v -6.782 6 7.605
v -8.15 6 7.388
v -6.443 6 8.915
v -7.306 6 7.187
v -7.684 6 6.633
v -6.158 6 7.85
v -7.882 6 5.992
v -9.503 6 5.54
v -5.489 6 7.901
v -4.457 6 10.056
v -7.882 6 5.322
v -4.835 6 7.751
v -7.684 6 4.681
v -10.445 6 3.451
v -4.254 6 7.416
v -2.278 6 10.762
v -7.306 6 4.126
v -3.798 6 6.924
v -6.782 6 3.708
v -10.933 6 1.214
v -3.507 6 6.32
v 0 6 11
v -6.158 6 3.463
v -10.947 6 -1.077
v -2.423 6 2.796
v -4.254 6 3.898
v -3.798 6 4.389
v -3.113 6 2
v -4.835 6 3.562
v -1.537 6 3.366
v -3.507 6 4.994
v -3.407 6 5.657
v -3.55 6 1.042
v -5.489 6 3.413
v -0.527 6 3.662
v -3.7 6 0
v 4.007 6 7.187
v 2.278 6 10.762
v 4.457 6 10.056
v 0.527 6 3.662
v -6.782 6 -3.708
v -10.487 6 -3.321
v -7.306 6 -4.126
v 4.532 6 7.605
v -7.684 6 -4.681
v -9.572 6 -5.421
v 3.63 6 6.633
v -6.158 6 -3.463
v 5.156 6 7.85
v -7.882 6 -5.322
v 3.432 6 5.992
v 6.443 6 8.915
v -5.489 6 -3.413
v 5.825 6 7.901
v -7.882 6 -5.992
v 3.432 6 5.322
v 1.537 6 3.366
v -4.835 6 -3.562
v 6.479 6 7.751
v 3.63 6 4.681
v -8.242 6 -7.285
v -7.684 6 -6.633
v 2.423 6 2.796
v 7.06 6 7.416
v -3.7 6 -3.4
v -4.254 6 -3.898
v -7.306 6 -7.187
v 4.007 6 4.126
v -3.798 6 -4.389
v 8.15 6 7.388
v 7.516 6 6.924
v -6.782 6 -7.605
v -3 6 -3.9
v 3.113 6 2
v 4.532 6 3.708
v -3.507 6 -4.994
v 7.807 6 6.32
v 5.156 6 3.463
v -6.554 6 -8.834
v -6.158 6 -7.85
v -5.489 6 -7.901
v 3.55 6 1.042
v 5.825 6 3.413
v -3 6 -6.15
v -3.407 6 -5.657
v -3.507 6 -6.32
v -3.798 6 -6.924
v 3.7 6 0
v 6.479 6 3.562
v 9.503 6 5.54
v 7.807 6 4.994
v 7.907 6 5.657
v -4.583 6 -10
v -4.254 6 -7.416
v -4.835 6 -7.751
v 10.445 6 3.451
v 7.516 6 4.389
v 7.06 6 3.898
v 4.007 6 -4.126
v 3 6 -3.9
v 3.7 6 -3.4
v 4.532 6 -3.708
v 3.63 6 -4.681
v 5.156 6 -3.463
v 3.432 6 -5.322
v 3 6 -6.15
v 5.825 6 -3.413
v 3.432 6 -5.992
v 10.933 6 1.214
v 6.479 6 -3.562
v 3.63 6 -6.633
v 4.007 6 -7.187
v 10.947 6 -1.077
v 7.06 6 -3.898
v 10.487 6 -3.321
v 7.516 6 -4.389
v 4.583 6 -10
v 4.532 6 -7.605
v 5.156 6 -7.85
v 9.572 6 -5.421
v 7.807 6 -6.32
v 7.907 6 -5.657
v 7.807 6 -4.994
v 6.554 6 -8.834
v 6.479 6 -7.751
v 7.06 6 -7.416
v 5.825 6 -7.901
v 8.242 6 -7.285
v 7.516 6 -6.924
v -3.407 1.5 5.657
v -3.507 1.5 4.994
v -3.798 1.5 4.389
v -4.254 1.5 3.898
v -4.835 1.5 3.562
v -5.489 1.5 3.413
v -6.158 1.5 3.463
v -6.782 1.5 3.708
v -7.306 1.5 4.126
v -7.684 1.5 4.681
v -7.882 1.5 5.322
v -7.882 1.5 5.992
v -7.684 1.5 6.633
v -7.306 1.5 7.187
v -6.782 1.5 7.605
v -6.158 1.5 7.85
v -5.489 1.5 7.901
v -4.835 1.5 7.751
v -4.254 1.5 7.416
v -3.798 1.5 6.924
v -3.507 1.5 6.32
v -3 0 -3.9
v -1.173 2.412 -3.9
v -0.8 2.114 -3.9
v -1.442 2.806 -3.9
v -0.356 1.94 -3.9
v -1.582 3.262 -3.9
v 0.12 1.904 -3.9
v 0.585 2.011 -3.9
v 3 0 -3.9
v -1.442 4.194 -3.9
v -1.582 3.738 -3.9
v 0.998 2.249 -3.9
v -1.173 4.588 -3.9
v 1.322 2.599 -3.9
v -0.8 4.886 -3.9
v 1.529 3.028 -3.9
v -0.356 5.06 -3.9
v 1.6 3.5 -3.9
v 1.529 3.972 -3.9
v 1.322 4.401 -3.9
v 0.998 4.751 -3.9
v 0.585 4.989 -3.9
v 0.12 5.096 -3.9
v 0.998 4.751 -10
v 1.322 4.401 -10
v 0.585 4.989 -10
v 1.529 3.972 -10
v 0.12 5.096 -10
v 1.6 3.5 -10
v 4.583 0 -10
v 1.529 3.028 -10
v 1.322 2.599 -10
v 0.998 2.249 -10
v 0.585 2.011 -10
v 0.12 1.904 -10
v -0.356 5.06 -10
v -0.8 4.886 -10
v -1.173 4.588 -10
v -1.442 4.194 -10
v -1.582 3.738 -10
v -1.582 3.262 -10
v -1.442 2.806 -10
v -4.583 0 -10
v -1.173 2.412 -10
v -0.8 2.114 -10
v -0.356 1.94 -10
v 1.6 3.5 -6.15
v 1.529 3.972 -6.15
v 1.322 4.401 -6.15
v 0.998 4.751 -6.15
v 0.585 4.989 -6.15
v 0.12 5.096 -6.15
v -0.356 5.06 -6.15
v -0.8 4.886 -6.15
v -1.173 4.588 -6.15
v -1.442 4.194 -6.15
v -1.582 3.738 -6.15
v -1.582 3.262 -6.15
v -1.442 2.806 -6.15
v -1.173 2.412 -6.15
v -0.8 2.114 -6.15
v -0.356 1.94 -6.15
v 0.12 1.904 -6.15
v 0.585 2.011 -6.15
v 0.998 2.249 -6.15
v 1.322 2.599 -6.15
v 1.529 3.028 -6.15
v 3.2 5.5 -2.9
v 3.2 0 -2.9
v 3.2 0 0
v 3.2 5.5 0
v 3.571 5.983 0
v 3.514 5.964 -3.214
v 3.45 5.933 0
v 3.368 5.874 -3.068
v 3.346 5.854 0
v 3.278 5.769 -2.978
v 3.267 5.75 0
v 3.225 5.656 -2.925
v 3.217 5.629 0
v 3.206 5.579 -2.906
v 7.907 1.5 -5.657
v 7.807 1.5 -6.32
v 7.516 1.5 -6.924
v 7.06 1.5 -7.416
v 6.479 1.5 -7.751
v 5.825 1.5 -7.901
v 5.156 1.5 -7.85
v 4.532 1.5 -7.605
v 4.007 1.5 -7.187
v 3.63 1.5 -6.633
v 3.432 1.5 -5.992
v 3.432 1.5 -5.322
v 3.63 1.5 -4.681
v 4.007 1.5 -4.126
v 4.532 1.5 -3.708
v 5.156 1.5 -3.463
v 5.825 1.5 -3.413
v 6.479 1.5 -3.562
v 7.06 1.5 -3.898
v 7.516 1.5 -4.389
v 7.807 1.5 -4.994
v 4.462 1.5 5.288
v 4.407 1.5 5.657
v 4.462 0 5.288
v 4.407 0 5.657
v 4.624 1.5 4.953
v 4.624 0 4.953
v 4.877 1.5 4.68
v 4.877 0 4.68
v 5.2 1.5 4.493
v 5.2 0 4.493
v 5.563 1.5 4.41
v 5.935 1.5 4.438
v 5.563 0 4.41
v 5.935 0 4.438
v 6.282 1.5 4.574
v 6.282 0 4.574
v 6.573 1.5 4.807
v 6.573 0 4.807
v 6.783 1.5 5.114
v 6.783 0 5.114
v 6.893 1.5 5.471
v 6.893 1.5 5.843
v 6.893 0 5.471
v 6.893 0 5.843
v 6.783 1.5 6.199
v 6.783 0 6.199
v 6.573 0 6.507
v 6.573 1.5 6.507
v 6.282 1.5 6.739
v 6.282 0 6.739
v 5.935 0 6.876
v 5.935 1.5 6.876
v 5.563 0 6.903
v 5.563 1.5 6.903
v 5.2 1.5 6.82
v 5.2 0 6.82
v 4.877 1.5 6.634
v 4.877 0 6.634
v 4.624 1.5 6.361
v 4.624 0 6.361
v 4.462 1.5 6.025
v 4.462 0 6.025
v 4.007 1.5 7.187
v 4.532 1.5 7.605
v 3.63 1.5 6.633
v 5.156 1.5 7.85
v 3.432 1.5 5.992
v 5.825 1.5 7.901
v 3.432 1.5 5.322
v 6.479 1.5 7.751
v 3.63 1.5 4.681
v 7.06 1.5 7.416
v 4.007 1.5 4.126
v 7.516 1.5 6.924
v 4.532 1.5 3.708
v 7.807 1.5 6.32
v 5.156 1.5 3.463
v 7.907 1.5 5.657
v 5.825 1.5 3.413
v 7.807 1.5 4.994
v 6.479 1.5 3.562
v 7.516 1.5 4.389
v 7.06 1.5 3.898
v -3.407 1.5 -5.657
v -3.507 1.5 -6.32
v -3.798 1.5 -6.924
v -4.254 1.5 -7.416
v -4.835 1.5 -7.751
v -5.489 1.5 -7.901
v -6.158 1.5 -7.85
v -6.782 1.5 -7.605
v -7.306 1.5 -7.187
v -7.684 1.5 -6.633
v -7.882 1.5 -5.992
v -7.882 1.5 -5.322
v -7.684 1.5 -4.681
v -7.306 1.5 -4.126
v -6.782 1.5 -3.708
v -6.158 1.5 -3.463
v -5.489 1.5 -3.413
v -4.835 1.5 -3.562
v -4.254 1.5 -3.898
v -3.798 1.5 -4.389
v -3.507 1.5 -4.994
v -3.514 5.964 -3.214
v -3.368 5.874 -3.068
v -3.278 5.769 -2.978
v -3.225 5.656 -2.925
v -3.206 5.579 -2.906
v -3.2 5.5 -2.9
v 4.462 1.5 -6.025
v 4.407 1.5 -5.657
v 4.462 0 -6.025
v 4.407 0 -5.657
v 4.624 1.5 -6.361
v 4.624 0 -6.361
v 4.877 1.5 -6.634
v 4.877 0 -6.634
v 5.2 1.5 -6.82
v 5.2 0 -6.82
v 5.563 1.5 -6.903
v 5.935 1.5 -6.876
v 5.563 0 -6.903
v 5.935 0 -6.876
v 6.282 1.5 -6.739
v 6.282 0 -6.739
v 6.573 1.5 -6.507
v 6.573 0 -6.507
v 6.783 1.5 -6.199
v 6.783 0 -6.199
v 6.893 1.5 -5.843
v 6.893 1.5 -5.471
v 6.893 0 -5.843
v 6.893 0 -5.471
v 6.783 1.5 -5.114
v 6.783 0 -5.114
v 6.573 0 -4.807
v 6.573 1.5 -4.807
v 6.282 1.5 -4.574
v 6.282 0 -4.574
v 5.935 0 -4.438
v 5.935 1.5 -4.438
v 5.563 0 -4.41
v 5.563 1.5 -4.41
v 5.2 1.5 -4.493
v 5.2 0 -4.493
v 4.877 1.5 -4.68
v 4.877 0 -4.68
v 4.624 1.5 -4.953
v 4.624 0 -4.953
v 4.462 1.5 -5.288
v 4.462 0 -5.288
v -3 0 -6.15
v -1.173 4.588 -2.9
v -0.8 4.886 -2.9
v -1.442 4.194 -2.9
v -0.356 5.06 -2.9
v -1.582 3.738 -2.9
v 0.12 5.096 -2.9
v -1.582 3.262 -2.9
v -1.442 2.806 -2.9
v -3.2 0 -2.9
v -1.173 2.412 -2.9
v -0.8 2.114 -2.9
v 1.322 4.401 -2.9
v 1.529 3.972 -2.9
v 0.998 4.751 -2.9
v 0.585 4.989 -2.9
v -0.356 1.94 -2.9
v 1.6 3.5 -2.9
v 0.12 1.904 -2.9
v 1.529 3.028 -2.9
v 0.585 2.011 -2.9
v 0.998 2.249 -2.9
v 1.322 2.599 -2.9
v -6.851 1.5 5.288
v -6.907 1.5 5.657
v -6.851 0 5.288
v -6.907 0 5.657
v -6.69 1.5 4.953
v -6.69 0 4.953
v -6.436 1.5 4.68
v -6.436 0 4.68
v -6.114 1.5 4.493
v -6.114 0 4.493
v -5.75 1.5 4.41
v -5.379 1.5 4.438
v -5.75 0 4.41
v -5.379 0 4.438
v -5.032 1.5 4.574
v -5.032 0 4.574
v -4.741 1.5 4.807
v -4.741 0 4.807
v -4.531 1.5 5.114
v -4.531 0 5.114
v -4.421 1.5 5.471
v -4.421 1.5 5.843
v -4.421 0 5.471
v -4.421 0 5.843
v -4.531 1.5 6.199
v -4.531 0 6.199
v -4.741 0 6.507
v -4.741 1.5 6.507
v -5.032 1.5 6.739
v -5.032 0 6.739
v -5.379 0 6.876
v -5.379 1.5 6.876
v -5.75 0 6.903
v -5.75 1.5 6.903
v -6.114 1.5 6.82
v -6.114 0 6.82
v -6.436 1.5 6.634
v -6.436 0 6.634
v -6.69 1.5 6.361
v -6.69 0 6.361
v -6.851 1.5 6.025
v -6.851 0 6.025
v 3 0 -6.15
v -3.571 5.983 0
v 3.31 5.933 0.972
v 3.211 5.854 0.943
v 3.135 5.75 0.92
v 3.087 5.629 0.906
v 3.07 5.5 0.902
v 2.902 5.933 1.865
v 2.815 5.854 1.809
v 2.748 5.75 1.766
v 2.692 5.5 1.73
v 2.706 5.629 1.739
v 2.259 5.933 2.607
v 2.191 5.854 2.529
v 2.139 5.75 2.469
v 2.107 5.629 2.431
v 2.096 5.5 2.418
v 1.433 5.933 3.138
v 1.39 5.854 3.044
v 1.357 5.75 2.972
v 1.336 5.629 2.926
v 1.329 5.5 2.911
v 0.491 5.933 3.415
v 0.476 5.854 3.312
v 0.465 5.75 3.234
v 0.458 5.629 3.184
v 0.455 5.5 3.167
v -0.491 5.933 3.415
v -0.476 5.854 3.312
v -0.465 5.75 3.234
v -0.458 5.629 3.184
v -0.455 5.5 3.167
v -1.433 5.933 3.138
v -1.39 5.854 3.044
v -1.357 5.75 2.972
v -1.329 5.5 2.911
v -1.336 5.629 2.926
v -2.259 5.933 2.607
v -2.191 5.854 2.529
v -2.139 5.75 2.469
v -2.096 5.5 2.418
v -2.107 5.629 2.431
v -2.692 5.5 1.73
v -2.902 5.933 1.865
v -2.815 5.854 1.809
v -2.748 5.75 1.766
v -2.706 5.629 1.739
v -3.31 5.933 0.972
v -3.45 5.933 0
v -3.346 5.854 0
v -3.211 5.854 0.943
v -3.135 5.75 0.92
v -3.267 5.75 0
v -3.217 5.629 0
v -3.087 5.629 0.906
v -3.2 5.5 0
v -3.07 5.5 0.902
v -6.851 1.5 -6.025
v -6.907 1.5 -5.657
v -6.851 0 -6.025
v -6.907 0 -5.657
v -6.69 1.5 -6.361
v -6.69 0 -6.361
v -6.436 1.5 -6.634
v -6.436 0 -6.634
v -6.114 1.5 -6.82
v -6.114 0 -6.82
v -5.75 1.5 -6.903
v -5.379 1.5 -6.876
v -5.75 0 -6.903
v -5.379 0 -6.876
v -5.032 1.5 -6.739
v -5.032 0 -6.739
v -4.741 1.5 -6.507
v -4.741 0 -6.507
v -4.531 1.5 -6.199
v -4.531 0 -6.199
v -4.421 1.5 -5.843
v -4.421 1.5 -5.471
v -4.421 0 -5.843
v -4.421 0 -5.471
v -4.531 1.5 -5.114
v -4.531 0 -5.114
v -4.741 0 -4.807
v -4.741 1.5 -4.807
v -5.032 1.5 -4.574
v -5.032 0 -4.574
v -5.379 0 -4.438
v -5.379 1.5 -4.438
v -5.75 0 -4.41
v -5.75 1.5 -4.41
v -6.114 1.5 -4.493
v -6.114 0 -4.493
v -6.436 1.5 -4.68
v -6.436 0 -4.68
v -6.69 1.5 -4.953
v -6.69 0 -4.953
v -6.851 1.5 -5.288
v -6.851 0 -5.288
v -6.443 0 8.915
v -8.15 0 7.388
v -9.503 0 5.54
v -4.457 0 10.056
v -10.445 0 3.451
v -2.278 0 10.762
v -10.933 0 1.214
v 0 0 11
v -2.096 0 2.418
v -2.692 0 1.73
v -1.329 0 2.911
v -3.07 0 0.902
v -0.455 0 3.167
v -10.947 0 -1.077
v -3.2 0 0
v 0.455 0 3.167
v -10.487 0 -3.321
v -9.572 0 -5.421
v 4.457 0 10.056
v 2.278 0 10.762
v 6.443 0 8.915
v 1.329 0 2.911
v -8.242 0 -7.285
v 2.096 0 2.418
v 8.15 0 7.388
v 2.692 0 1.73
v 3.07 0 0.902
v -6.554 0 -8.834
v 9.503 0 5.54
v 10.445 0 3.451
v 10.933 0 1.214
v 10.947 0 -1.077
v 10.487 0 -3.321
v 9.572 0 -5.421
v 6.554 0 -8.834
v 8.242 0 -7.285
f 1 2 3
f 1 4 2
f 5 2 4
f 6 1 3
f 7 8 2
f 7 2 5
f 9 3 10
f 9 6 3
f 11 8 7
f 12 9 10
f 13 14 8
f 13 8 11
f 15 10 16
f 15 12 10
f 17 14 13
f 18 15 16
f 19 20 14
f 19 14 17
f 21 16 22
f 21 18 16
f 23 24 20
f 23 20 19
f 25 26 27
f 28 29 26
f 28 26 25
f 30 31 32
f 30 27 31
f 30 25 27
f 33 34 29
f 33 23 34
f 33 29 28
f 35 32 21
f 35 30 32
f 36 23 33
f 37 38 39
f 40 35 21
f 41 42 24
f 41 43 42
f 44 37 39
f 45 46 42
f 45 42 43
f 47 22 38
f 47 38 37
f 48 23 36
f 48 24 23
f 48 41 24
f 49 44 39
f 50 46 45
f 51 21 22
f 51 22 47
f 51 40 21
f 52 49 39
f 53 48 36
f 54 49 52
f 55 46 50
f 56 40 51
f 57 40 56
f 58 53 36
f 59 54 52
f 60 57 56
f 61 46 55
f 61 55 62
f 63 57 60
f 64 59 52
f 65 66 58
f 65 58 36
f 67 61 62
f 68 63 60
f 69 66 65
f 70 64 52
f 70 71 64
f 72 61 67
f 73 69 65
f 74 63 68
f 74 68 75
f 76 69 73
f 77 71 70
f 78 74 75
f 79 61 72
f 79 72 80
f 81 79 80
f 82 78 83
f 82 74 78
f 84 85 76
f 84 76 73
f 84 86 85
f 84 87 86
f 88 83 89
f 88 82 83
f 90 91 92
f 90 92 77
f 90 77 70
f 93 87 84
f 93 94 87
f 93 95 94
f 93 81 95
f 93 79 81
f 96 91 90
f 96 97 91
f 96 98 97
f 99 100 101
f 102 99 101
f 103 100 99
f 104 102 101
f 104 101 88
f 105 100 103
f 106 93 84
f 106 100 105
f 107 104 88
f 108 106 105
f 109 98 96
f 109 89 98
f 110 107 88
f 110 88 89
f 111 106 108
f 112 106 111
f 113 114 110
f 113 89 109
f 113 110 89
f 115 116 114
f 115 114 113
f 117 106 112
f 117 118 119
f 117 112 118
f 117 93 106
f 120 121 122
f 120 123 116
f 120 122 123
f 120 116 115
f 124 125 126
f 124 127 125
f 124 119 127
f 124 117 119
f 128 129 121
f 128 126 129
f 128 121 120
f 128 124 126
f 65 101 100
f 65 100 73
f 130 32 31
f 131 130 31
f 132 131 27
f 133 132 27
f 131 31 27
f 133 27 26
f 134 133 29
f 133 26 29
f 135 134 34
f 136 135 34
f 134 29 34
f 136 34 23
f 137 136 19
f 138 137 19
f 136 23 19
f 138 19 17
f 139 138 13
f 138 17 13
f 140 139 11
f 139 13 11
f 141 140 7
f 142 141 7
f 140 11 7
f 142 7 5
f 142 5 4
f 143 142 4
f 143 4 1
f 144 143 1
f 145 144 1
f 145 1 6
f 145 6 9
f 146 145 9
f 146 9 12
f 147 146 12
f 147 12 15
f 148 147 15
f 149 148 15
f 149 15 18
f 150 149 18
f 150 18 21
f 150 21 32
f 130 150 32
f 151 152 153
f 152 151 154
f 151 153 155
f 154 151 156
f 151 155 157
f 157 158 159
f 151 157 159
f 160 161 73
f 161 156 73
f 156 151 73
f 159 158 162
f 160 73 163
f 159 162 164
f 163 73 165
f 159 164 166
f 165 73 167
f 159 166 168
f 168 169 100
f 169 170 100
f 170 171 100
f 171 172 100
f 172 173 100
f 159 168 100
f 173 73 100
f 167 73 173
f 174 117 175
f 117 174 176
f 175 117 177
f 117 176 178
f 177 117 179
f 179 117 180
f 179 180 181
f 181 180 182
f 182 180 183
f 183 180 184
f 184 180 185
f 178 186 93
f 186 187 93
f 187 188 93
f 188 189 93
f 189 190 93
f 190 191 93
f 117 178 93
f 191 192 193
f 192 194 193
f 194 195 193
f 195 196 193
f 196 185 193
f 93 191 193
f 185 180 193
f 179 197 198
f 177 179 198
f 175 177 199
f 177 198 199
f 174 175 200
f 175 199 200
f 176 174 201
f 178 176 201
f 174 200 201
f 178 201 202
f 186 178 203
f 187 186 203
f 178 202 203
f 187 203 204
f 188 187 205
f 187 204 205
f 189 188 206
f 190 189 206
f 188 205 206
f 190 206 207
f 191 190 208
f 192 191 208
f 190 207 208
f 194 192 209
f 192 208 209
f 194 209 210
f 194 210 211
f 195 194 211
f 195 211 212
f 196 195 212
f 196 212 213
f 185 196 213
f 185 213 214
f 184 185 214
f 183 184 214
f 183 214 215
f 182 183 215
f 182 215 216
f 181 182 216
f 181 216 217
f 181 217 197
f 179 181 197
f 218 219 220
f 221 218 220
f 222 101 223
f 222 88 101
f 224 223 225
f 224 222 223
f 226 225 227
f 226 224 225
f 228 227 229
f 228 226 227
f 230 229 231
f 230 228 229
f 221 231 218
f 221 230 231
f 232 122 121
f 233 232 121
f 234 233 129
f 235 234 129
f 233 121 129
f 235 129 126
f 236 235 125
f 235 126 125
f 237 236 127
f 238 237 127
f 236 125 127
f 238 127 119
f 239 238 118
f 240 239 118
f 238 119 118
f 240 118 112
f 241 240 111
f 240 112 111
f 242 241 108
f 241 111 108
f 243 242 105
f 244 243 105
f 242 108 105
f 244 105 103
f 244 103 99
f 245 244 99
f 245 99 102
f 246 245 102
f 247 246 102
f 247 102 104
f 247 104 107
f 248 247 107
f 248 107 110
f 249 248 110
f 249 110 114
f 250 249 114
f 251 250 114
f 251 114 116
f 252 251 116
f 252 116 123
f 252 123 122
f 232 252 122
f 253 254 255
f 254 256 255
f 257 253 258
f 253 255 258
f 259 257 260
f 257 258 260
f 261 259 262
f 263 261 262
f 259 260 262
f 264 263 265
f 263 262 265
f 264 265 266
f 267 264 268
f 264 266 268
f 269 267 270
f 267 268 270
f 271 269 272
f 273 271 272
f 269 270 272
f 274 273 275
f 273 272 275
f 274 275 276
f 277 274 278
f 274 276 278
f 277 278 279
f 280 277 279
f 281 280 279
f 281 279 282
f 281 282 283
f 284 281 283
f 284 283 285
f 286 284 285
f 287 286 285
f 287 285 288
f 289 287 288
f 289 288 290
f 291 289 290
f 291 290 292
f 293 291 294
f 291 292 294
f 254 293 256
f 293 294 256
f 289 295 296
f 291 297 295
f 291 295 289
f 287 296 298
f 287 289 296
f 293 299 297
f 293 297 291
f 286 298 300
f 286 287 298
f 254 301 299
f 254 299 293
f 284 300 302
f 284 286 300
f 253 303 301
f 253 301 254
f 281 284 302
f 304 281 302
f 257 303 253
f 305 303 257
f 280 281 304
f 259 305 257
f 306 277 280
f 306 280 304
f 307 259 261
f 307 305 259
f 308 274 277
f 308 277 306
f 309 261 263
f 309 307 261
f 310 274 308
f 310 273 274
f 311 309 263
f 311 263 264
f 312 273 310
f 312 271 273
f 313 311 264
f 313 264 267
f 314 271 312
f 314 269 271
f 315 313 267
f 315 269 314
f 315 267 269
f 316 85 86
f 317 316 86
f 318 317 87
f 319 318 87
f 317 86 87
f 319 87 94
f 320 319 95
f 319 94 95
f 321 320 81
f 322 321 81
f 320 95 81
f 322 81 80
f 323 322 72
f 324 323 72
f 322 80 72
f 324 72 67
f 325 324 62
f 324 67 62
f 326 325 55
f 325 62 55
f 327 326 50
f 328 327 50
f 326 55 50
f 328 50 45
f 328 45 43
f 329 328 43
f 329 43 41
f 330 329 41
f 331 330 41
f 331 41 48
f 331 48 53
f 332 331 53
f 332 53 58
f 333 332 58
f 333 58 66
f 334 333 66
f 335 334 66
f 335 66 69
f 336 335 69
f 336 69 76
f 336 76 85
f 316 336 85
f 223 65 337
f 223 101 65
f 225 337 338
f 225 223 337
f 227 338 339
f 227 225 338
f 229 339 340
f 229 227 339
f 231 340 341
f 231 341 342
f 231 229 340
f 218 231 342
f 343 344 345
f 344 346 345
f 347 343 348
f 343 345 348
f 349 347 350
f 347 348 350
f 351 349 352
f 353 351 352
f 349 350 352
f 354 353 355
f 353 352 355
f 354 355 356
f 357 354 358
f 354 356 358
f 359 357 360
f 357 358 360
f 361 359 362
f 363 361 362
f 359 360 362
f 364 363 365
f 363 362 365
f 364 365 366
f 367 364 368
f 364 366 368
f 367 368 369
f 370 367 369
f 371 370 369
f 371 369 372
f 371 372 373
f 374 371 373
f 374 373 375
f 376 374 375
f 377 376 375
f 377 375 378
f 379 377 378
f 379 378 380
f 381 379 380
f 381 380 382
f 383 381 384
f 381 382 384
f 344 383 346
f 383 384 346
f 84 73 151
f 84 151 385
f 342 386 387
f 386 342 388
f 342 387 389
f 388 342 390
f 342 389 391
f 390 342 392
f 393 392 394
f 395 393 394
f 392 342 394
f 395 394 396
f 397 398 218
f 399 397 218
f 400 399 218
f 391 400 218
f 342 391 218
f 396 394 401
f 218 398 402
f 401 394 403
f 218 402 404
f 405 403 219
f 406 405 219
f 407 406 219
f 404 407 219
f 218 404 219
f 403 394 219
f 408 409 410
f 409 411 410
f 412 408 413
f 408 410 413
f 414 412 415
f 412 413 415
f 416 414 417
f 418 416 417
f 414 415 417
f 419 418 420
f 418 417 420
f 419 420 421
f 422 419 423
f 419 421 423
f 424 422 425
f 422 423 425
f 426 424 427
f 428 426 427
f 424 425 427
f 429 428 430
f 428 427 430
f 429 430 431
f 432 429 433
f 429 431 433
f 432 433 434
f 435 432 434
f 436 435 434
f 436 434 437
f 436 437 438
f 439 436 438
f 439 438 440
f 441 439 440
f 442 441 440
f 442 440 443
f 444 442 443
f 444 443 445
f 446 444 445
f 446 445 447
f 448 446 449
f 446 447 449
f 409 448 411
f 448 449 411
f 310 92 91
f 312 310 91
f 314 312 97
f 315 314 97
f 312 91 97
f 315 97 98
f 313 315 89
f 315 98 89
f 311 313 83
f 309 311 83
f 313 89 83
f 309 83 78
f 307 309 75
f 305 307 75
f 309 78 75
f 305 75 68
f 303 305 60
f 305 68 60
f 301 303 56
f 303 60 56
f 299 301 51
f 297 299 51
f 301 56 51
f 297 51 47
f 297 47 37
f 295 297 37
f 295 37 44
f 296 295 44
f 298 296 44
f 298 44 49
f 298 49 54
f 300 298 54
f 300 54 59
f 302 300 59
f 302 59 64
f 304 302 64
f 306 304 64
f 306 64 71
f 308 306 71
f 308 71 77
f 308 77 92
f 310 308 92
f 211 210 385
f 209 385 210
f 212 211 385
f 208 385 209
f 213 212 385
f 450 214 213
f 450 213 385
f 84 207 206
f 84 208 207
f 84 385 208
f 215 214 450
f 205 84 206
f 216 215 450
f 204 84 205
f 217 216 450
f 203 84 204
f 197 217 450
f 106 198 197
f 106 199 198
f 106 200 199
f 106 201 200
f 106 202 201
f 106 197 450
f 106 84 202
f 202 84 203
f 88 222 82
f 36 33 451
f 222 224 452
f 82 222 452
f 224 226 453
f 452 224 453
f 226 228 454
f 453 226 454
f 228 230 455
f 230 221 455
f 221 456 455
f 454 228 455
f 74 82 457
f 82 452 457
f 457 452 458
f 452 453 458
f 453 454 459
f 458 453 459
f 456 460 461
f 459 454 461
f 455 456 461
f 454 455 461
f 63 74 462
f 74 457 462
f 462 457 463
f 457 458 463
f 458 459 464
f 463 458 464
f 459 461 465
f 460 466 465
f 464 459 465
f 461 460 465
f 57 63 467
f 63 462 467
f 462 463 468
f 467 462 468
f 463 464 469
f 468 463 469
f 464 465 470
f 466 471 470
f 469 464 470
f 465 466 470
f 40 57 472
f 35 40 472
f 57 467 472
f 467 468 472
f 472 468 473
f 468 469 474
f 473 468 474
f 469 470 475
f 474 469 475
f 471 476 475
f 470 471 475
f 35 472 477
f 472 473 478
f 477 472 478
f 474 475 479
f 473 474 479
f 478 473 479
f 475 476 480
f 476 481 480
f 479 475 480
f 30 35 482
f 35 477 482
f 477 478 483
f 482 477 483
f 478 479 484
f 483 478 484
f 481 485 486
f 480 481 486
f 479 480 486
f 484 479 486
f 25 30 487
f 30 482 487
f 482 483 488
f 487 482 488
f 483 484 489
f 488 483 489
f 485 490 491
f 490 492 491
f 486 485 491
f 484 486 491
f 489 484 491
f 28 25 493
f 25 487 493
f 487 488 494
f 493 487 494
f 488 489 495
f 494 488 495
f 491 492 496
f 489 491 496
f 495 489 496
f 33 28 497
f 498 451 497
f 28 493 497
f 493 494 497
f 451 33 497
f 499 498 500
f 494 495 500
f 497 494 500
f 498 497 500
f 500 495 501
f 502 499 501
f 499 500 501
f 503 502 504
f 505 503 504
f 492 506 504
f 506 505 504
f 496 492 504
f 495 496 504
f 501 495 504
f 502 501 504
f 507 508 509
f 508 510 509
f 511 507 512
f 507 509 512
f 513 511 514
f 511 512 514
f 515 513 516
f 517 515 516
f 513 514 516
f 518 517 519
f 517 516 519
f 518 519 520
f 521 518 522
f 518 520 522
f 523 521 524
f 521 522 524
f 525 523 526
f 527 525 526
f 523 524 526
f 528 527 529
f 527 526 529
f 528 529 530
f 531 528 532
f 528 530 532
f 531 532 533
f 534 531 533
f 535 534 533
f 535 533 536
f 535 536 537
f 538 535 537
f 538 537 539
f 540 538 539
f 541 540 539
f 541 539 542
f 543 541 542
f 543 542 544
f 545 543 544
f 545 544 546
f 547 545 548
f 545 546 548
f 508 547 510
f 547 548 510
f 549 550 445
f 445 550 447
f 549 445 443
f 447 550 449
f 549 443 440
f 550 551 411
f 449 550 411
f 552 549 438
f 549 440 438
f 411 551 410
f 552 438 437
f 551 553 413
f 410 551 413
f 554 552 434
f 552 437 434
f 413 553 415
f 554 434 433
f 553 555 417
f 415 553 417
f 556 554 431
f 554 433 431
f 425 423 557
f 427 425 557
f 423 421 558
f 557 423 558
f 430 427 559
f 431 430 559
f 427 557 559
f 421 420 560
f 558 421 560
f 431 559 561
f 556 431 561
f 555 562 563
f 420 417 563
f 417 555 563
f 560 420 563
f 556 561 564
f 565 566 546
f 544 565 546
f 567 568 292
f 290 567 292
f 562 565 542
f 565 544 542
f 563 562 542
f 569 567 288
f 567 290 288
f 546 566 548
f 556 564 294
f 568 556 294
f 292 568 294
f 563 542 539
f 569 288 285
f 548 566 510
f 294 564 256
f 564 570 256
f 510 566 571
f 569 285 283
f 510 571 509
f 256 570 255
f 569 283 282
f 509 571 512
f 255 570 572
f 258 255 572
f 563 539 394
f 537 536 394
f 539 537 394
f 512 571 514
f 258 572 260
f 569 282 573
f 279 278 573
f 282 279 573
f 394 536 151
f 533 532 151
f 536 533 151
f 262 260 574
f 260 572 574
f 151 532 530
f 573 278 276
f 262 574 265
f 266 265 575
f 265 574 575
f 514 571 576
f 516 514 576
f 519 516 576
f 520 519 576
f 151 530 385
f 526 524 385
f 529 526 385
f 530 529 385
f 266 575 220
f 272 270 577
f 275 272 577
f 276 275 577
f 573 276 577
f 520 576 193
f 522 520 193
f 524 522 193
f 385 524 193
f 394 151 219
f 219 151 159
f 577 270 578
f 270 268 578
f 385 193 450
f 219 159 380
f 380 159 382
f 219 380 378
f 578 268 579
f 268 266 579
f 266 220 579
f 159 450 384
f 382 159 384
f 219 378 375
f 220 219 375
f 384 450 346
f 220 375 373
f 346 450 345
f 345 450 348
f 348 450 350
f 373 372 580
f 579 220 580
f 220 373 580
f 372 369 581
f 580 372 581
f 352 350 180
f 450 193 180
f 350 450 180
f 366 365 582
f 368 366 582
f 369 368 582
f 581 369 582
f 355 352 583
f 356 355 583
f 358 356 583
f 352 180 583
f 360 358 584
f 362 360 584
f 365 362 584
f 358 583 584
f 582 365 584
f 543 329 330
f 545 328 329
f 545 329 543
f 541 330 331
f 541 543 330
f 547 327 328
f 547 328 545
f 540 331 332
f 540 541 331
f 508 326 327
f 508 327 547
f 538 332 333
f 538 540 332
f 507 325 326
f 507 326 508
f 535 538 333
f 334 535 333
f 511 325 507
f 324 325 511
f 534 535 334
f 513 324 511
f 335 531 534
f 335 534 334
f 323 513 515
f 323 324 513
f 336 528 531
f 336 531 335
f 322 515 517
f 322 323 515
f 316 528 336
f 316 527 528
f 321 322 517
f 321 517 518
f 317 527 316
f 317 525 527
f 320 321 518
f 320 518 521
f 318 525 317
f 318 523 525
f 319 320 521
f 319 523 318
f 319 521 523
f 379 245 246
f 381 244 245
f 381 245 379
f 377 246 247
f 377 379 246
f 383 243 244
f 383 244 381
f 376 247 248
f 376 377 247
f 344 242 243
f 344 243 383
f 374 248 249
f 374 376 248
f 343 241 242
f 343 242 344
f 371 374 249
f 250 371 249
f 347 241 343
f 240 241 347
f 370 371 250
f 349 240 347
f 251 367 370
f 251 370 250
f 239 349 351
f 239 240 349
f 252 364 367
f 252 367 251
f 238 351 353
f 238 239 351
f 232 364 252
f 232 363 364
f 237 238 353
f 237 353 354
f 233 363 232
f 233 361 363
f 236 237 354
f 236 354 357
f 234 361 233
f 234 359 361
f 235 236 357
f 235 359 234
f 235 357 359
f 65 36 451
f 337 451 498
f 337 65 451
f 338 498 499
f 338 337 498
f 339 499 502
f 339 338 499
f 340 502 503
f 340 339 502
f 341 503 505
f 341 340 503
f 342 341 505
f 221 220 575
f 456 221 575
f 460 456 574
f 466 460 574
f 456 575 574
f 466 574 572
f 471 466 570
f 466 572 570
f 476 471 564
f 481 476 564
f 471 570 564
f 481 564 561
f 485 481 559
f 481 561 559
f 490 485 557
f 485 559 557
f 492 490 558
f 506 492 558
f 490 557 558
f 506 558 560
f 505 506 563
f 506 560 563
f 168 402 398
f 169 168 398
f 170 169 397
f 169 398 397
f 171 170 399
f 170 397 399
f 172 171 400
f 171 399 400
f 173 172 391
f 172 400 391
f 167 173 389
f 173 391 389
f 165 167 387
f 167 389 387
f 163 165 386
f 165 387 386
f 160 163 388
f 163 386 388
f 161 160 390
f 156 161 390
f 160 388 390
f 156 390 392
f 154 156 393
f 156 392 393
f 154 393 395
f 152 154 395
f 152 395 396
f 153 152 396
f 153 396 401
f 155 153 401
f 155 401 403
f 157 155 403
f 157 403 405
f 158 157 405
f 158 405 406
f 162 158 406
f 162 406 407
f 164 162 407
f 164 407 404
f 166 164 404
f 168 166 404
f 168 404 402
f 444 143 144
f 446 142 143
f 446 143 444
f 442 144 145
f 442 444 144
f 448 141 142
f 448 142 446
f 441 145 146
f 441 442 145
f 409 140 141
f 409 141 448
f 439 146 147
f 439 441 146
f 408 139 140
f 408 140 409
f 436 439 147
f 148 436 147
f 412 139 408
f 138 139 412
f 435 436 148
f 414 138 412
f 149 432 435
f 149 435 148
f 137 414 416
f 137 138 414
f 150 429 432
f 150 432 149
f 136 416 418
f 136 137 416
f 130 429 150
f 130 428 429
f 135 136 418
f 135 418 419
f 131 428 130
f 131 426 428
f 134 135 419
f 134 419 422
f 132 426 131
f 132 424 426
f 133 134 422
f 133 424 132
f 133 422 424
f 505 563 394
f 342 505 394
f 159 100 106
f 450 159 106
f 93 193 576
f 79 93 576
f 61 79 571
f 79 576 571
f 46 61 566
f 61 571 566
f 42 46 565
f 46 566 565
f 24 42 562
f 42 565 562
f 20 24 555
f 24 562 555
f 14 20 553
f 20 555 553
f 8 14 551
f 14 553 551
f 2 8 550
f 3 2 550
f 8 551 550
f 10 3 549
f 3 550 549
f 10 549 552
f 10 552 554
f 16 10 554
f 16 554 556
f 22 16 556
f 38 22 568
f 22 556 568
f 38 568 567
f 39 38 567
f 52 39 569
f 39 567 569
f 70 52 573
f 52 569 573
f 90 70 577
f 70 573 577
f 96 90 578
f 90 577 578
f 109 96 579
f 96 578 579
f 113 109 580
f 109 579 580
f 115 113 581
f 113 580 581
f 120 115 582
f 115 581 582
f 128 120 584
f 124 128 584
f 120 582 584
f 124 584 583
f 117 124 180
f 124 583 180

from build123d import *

# Parameters (mm, degrees)
BOSS_EXTRU_1_DEPTH                              = 6
CHAMBRAGE_POUR_VIS_T_TE_CYLINDRIQUE_D           = 2.5
CHAMBRAGE_POUR_VIS_T_TE_CYLINDRIQUE_CBORE_D     = 4.5
CHAMBRAGE_POUR_VIS_T_TE_CYLINDRIQUE_CBORE_DEPTH = 4.5
CONG_1_R                                        = 0.5
ESQUISSE6_R                                     = 1.6
ENL_V_MAT_EXTRU_1_DEPTH                         = 17.673332037
ESQUISSE7_W                                     = 6
ESQUISSE7_H                                     = 2.25
ENL_V_MAT_EXTRU_2_DEPTH                         = 17.673332001


with BuildPart() as part:
    # Esquisse1 → Boss.-Extru.1 (new body)
    with BuildSketch(Plane(origin=(0, 0, 0), x_dir=(1, 0, 0), z_dir=(0, 1, 0))):
        with BuildLine():
            Line((4.582575695, 10), (-4.582575695, 10))
            ThreePointArc((-4.582575695, 10), (0, -11), (4.582575695, 10))
        make_face()
        with BuildLine():
            Line((-3.2, 0), (-3.2, 2.9))
            Line((-3.2, 2.9), (3.2, 2.9))
            Line((3.2, 2.9), (3.2, 0))
            ThreePointArc((3.2, 0), (0, -3.2), (-3.2, 0))
        make_face(mode=Mode.SUBTRACT)
    extrude(amount=BOSS_EXTRU_1_DEPTH)

    # Chambrage pour vis à tête cylindrique à 6 pans creux (ou vis CHC) M21 (through all)
    with Locations(Plane(origin=(0, 6, 0), x_dir=(1, 0, 0), z_dir=(0, 1, 0))):
        with Locations((5.656854249, 5.656854249), (5.656854249, -5.656854249), (-5.656854249, -5.656854249), (-5.656854249, 5.656854249), (0, 0)):
            CounterBoreHole(CHAMBRAGE_POUR_VIS_T_TE_CYLINDRIQUE_D / 2, CHAMBRAGE_POUR_VIS_T_TE_CYLINDRIQUE_CBORE_D / 2, CHAMBRAGE_POUR_VIS_T_TE_CYLINDRIQUE_CBORE_DEPTH)

    # Congé1
    cong_1_edges = [part.edges().sort_by_distance(p)[0] for p in [
        (0, 6, 3.2),
        (3.2, 6, -1.45),
        (0, 6, -2.9),
        (-3.2, 6, -1.45),
    ]]
    fillet(cong_1_edges, radius=CONG_1_R)

    # Esquisse6 → Enlèv. mat.-Extru.1 (cut, through all)
    with BuildSketch(Plane.XY):
        with Locations((0, 3.5)):
            Circle(ESQUISSE6_R)
    extrude(amount=-ENL_V_MAT_EXTRU_1_DEPTH, mode=Mode.SUBTRACT)

    # Esquisse7 → Enlèv. mat.-Extru.2 (cut, through all)
    with BuildSketch(Plane(origin=(0, 6, 0), x_dir=(1, 0, 0), z_dir=(0, 1, 0))):
        with Locations((0, 5.025)):
            Rectangle(ESQUISSE7_W, ESQUISSE7_H)
    extrude(amount=-ENL_V_MAT_EXTRU_2_DEPTH, mode=Mode.SUBTRACT)


solid = part.part
